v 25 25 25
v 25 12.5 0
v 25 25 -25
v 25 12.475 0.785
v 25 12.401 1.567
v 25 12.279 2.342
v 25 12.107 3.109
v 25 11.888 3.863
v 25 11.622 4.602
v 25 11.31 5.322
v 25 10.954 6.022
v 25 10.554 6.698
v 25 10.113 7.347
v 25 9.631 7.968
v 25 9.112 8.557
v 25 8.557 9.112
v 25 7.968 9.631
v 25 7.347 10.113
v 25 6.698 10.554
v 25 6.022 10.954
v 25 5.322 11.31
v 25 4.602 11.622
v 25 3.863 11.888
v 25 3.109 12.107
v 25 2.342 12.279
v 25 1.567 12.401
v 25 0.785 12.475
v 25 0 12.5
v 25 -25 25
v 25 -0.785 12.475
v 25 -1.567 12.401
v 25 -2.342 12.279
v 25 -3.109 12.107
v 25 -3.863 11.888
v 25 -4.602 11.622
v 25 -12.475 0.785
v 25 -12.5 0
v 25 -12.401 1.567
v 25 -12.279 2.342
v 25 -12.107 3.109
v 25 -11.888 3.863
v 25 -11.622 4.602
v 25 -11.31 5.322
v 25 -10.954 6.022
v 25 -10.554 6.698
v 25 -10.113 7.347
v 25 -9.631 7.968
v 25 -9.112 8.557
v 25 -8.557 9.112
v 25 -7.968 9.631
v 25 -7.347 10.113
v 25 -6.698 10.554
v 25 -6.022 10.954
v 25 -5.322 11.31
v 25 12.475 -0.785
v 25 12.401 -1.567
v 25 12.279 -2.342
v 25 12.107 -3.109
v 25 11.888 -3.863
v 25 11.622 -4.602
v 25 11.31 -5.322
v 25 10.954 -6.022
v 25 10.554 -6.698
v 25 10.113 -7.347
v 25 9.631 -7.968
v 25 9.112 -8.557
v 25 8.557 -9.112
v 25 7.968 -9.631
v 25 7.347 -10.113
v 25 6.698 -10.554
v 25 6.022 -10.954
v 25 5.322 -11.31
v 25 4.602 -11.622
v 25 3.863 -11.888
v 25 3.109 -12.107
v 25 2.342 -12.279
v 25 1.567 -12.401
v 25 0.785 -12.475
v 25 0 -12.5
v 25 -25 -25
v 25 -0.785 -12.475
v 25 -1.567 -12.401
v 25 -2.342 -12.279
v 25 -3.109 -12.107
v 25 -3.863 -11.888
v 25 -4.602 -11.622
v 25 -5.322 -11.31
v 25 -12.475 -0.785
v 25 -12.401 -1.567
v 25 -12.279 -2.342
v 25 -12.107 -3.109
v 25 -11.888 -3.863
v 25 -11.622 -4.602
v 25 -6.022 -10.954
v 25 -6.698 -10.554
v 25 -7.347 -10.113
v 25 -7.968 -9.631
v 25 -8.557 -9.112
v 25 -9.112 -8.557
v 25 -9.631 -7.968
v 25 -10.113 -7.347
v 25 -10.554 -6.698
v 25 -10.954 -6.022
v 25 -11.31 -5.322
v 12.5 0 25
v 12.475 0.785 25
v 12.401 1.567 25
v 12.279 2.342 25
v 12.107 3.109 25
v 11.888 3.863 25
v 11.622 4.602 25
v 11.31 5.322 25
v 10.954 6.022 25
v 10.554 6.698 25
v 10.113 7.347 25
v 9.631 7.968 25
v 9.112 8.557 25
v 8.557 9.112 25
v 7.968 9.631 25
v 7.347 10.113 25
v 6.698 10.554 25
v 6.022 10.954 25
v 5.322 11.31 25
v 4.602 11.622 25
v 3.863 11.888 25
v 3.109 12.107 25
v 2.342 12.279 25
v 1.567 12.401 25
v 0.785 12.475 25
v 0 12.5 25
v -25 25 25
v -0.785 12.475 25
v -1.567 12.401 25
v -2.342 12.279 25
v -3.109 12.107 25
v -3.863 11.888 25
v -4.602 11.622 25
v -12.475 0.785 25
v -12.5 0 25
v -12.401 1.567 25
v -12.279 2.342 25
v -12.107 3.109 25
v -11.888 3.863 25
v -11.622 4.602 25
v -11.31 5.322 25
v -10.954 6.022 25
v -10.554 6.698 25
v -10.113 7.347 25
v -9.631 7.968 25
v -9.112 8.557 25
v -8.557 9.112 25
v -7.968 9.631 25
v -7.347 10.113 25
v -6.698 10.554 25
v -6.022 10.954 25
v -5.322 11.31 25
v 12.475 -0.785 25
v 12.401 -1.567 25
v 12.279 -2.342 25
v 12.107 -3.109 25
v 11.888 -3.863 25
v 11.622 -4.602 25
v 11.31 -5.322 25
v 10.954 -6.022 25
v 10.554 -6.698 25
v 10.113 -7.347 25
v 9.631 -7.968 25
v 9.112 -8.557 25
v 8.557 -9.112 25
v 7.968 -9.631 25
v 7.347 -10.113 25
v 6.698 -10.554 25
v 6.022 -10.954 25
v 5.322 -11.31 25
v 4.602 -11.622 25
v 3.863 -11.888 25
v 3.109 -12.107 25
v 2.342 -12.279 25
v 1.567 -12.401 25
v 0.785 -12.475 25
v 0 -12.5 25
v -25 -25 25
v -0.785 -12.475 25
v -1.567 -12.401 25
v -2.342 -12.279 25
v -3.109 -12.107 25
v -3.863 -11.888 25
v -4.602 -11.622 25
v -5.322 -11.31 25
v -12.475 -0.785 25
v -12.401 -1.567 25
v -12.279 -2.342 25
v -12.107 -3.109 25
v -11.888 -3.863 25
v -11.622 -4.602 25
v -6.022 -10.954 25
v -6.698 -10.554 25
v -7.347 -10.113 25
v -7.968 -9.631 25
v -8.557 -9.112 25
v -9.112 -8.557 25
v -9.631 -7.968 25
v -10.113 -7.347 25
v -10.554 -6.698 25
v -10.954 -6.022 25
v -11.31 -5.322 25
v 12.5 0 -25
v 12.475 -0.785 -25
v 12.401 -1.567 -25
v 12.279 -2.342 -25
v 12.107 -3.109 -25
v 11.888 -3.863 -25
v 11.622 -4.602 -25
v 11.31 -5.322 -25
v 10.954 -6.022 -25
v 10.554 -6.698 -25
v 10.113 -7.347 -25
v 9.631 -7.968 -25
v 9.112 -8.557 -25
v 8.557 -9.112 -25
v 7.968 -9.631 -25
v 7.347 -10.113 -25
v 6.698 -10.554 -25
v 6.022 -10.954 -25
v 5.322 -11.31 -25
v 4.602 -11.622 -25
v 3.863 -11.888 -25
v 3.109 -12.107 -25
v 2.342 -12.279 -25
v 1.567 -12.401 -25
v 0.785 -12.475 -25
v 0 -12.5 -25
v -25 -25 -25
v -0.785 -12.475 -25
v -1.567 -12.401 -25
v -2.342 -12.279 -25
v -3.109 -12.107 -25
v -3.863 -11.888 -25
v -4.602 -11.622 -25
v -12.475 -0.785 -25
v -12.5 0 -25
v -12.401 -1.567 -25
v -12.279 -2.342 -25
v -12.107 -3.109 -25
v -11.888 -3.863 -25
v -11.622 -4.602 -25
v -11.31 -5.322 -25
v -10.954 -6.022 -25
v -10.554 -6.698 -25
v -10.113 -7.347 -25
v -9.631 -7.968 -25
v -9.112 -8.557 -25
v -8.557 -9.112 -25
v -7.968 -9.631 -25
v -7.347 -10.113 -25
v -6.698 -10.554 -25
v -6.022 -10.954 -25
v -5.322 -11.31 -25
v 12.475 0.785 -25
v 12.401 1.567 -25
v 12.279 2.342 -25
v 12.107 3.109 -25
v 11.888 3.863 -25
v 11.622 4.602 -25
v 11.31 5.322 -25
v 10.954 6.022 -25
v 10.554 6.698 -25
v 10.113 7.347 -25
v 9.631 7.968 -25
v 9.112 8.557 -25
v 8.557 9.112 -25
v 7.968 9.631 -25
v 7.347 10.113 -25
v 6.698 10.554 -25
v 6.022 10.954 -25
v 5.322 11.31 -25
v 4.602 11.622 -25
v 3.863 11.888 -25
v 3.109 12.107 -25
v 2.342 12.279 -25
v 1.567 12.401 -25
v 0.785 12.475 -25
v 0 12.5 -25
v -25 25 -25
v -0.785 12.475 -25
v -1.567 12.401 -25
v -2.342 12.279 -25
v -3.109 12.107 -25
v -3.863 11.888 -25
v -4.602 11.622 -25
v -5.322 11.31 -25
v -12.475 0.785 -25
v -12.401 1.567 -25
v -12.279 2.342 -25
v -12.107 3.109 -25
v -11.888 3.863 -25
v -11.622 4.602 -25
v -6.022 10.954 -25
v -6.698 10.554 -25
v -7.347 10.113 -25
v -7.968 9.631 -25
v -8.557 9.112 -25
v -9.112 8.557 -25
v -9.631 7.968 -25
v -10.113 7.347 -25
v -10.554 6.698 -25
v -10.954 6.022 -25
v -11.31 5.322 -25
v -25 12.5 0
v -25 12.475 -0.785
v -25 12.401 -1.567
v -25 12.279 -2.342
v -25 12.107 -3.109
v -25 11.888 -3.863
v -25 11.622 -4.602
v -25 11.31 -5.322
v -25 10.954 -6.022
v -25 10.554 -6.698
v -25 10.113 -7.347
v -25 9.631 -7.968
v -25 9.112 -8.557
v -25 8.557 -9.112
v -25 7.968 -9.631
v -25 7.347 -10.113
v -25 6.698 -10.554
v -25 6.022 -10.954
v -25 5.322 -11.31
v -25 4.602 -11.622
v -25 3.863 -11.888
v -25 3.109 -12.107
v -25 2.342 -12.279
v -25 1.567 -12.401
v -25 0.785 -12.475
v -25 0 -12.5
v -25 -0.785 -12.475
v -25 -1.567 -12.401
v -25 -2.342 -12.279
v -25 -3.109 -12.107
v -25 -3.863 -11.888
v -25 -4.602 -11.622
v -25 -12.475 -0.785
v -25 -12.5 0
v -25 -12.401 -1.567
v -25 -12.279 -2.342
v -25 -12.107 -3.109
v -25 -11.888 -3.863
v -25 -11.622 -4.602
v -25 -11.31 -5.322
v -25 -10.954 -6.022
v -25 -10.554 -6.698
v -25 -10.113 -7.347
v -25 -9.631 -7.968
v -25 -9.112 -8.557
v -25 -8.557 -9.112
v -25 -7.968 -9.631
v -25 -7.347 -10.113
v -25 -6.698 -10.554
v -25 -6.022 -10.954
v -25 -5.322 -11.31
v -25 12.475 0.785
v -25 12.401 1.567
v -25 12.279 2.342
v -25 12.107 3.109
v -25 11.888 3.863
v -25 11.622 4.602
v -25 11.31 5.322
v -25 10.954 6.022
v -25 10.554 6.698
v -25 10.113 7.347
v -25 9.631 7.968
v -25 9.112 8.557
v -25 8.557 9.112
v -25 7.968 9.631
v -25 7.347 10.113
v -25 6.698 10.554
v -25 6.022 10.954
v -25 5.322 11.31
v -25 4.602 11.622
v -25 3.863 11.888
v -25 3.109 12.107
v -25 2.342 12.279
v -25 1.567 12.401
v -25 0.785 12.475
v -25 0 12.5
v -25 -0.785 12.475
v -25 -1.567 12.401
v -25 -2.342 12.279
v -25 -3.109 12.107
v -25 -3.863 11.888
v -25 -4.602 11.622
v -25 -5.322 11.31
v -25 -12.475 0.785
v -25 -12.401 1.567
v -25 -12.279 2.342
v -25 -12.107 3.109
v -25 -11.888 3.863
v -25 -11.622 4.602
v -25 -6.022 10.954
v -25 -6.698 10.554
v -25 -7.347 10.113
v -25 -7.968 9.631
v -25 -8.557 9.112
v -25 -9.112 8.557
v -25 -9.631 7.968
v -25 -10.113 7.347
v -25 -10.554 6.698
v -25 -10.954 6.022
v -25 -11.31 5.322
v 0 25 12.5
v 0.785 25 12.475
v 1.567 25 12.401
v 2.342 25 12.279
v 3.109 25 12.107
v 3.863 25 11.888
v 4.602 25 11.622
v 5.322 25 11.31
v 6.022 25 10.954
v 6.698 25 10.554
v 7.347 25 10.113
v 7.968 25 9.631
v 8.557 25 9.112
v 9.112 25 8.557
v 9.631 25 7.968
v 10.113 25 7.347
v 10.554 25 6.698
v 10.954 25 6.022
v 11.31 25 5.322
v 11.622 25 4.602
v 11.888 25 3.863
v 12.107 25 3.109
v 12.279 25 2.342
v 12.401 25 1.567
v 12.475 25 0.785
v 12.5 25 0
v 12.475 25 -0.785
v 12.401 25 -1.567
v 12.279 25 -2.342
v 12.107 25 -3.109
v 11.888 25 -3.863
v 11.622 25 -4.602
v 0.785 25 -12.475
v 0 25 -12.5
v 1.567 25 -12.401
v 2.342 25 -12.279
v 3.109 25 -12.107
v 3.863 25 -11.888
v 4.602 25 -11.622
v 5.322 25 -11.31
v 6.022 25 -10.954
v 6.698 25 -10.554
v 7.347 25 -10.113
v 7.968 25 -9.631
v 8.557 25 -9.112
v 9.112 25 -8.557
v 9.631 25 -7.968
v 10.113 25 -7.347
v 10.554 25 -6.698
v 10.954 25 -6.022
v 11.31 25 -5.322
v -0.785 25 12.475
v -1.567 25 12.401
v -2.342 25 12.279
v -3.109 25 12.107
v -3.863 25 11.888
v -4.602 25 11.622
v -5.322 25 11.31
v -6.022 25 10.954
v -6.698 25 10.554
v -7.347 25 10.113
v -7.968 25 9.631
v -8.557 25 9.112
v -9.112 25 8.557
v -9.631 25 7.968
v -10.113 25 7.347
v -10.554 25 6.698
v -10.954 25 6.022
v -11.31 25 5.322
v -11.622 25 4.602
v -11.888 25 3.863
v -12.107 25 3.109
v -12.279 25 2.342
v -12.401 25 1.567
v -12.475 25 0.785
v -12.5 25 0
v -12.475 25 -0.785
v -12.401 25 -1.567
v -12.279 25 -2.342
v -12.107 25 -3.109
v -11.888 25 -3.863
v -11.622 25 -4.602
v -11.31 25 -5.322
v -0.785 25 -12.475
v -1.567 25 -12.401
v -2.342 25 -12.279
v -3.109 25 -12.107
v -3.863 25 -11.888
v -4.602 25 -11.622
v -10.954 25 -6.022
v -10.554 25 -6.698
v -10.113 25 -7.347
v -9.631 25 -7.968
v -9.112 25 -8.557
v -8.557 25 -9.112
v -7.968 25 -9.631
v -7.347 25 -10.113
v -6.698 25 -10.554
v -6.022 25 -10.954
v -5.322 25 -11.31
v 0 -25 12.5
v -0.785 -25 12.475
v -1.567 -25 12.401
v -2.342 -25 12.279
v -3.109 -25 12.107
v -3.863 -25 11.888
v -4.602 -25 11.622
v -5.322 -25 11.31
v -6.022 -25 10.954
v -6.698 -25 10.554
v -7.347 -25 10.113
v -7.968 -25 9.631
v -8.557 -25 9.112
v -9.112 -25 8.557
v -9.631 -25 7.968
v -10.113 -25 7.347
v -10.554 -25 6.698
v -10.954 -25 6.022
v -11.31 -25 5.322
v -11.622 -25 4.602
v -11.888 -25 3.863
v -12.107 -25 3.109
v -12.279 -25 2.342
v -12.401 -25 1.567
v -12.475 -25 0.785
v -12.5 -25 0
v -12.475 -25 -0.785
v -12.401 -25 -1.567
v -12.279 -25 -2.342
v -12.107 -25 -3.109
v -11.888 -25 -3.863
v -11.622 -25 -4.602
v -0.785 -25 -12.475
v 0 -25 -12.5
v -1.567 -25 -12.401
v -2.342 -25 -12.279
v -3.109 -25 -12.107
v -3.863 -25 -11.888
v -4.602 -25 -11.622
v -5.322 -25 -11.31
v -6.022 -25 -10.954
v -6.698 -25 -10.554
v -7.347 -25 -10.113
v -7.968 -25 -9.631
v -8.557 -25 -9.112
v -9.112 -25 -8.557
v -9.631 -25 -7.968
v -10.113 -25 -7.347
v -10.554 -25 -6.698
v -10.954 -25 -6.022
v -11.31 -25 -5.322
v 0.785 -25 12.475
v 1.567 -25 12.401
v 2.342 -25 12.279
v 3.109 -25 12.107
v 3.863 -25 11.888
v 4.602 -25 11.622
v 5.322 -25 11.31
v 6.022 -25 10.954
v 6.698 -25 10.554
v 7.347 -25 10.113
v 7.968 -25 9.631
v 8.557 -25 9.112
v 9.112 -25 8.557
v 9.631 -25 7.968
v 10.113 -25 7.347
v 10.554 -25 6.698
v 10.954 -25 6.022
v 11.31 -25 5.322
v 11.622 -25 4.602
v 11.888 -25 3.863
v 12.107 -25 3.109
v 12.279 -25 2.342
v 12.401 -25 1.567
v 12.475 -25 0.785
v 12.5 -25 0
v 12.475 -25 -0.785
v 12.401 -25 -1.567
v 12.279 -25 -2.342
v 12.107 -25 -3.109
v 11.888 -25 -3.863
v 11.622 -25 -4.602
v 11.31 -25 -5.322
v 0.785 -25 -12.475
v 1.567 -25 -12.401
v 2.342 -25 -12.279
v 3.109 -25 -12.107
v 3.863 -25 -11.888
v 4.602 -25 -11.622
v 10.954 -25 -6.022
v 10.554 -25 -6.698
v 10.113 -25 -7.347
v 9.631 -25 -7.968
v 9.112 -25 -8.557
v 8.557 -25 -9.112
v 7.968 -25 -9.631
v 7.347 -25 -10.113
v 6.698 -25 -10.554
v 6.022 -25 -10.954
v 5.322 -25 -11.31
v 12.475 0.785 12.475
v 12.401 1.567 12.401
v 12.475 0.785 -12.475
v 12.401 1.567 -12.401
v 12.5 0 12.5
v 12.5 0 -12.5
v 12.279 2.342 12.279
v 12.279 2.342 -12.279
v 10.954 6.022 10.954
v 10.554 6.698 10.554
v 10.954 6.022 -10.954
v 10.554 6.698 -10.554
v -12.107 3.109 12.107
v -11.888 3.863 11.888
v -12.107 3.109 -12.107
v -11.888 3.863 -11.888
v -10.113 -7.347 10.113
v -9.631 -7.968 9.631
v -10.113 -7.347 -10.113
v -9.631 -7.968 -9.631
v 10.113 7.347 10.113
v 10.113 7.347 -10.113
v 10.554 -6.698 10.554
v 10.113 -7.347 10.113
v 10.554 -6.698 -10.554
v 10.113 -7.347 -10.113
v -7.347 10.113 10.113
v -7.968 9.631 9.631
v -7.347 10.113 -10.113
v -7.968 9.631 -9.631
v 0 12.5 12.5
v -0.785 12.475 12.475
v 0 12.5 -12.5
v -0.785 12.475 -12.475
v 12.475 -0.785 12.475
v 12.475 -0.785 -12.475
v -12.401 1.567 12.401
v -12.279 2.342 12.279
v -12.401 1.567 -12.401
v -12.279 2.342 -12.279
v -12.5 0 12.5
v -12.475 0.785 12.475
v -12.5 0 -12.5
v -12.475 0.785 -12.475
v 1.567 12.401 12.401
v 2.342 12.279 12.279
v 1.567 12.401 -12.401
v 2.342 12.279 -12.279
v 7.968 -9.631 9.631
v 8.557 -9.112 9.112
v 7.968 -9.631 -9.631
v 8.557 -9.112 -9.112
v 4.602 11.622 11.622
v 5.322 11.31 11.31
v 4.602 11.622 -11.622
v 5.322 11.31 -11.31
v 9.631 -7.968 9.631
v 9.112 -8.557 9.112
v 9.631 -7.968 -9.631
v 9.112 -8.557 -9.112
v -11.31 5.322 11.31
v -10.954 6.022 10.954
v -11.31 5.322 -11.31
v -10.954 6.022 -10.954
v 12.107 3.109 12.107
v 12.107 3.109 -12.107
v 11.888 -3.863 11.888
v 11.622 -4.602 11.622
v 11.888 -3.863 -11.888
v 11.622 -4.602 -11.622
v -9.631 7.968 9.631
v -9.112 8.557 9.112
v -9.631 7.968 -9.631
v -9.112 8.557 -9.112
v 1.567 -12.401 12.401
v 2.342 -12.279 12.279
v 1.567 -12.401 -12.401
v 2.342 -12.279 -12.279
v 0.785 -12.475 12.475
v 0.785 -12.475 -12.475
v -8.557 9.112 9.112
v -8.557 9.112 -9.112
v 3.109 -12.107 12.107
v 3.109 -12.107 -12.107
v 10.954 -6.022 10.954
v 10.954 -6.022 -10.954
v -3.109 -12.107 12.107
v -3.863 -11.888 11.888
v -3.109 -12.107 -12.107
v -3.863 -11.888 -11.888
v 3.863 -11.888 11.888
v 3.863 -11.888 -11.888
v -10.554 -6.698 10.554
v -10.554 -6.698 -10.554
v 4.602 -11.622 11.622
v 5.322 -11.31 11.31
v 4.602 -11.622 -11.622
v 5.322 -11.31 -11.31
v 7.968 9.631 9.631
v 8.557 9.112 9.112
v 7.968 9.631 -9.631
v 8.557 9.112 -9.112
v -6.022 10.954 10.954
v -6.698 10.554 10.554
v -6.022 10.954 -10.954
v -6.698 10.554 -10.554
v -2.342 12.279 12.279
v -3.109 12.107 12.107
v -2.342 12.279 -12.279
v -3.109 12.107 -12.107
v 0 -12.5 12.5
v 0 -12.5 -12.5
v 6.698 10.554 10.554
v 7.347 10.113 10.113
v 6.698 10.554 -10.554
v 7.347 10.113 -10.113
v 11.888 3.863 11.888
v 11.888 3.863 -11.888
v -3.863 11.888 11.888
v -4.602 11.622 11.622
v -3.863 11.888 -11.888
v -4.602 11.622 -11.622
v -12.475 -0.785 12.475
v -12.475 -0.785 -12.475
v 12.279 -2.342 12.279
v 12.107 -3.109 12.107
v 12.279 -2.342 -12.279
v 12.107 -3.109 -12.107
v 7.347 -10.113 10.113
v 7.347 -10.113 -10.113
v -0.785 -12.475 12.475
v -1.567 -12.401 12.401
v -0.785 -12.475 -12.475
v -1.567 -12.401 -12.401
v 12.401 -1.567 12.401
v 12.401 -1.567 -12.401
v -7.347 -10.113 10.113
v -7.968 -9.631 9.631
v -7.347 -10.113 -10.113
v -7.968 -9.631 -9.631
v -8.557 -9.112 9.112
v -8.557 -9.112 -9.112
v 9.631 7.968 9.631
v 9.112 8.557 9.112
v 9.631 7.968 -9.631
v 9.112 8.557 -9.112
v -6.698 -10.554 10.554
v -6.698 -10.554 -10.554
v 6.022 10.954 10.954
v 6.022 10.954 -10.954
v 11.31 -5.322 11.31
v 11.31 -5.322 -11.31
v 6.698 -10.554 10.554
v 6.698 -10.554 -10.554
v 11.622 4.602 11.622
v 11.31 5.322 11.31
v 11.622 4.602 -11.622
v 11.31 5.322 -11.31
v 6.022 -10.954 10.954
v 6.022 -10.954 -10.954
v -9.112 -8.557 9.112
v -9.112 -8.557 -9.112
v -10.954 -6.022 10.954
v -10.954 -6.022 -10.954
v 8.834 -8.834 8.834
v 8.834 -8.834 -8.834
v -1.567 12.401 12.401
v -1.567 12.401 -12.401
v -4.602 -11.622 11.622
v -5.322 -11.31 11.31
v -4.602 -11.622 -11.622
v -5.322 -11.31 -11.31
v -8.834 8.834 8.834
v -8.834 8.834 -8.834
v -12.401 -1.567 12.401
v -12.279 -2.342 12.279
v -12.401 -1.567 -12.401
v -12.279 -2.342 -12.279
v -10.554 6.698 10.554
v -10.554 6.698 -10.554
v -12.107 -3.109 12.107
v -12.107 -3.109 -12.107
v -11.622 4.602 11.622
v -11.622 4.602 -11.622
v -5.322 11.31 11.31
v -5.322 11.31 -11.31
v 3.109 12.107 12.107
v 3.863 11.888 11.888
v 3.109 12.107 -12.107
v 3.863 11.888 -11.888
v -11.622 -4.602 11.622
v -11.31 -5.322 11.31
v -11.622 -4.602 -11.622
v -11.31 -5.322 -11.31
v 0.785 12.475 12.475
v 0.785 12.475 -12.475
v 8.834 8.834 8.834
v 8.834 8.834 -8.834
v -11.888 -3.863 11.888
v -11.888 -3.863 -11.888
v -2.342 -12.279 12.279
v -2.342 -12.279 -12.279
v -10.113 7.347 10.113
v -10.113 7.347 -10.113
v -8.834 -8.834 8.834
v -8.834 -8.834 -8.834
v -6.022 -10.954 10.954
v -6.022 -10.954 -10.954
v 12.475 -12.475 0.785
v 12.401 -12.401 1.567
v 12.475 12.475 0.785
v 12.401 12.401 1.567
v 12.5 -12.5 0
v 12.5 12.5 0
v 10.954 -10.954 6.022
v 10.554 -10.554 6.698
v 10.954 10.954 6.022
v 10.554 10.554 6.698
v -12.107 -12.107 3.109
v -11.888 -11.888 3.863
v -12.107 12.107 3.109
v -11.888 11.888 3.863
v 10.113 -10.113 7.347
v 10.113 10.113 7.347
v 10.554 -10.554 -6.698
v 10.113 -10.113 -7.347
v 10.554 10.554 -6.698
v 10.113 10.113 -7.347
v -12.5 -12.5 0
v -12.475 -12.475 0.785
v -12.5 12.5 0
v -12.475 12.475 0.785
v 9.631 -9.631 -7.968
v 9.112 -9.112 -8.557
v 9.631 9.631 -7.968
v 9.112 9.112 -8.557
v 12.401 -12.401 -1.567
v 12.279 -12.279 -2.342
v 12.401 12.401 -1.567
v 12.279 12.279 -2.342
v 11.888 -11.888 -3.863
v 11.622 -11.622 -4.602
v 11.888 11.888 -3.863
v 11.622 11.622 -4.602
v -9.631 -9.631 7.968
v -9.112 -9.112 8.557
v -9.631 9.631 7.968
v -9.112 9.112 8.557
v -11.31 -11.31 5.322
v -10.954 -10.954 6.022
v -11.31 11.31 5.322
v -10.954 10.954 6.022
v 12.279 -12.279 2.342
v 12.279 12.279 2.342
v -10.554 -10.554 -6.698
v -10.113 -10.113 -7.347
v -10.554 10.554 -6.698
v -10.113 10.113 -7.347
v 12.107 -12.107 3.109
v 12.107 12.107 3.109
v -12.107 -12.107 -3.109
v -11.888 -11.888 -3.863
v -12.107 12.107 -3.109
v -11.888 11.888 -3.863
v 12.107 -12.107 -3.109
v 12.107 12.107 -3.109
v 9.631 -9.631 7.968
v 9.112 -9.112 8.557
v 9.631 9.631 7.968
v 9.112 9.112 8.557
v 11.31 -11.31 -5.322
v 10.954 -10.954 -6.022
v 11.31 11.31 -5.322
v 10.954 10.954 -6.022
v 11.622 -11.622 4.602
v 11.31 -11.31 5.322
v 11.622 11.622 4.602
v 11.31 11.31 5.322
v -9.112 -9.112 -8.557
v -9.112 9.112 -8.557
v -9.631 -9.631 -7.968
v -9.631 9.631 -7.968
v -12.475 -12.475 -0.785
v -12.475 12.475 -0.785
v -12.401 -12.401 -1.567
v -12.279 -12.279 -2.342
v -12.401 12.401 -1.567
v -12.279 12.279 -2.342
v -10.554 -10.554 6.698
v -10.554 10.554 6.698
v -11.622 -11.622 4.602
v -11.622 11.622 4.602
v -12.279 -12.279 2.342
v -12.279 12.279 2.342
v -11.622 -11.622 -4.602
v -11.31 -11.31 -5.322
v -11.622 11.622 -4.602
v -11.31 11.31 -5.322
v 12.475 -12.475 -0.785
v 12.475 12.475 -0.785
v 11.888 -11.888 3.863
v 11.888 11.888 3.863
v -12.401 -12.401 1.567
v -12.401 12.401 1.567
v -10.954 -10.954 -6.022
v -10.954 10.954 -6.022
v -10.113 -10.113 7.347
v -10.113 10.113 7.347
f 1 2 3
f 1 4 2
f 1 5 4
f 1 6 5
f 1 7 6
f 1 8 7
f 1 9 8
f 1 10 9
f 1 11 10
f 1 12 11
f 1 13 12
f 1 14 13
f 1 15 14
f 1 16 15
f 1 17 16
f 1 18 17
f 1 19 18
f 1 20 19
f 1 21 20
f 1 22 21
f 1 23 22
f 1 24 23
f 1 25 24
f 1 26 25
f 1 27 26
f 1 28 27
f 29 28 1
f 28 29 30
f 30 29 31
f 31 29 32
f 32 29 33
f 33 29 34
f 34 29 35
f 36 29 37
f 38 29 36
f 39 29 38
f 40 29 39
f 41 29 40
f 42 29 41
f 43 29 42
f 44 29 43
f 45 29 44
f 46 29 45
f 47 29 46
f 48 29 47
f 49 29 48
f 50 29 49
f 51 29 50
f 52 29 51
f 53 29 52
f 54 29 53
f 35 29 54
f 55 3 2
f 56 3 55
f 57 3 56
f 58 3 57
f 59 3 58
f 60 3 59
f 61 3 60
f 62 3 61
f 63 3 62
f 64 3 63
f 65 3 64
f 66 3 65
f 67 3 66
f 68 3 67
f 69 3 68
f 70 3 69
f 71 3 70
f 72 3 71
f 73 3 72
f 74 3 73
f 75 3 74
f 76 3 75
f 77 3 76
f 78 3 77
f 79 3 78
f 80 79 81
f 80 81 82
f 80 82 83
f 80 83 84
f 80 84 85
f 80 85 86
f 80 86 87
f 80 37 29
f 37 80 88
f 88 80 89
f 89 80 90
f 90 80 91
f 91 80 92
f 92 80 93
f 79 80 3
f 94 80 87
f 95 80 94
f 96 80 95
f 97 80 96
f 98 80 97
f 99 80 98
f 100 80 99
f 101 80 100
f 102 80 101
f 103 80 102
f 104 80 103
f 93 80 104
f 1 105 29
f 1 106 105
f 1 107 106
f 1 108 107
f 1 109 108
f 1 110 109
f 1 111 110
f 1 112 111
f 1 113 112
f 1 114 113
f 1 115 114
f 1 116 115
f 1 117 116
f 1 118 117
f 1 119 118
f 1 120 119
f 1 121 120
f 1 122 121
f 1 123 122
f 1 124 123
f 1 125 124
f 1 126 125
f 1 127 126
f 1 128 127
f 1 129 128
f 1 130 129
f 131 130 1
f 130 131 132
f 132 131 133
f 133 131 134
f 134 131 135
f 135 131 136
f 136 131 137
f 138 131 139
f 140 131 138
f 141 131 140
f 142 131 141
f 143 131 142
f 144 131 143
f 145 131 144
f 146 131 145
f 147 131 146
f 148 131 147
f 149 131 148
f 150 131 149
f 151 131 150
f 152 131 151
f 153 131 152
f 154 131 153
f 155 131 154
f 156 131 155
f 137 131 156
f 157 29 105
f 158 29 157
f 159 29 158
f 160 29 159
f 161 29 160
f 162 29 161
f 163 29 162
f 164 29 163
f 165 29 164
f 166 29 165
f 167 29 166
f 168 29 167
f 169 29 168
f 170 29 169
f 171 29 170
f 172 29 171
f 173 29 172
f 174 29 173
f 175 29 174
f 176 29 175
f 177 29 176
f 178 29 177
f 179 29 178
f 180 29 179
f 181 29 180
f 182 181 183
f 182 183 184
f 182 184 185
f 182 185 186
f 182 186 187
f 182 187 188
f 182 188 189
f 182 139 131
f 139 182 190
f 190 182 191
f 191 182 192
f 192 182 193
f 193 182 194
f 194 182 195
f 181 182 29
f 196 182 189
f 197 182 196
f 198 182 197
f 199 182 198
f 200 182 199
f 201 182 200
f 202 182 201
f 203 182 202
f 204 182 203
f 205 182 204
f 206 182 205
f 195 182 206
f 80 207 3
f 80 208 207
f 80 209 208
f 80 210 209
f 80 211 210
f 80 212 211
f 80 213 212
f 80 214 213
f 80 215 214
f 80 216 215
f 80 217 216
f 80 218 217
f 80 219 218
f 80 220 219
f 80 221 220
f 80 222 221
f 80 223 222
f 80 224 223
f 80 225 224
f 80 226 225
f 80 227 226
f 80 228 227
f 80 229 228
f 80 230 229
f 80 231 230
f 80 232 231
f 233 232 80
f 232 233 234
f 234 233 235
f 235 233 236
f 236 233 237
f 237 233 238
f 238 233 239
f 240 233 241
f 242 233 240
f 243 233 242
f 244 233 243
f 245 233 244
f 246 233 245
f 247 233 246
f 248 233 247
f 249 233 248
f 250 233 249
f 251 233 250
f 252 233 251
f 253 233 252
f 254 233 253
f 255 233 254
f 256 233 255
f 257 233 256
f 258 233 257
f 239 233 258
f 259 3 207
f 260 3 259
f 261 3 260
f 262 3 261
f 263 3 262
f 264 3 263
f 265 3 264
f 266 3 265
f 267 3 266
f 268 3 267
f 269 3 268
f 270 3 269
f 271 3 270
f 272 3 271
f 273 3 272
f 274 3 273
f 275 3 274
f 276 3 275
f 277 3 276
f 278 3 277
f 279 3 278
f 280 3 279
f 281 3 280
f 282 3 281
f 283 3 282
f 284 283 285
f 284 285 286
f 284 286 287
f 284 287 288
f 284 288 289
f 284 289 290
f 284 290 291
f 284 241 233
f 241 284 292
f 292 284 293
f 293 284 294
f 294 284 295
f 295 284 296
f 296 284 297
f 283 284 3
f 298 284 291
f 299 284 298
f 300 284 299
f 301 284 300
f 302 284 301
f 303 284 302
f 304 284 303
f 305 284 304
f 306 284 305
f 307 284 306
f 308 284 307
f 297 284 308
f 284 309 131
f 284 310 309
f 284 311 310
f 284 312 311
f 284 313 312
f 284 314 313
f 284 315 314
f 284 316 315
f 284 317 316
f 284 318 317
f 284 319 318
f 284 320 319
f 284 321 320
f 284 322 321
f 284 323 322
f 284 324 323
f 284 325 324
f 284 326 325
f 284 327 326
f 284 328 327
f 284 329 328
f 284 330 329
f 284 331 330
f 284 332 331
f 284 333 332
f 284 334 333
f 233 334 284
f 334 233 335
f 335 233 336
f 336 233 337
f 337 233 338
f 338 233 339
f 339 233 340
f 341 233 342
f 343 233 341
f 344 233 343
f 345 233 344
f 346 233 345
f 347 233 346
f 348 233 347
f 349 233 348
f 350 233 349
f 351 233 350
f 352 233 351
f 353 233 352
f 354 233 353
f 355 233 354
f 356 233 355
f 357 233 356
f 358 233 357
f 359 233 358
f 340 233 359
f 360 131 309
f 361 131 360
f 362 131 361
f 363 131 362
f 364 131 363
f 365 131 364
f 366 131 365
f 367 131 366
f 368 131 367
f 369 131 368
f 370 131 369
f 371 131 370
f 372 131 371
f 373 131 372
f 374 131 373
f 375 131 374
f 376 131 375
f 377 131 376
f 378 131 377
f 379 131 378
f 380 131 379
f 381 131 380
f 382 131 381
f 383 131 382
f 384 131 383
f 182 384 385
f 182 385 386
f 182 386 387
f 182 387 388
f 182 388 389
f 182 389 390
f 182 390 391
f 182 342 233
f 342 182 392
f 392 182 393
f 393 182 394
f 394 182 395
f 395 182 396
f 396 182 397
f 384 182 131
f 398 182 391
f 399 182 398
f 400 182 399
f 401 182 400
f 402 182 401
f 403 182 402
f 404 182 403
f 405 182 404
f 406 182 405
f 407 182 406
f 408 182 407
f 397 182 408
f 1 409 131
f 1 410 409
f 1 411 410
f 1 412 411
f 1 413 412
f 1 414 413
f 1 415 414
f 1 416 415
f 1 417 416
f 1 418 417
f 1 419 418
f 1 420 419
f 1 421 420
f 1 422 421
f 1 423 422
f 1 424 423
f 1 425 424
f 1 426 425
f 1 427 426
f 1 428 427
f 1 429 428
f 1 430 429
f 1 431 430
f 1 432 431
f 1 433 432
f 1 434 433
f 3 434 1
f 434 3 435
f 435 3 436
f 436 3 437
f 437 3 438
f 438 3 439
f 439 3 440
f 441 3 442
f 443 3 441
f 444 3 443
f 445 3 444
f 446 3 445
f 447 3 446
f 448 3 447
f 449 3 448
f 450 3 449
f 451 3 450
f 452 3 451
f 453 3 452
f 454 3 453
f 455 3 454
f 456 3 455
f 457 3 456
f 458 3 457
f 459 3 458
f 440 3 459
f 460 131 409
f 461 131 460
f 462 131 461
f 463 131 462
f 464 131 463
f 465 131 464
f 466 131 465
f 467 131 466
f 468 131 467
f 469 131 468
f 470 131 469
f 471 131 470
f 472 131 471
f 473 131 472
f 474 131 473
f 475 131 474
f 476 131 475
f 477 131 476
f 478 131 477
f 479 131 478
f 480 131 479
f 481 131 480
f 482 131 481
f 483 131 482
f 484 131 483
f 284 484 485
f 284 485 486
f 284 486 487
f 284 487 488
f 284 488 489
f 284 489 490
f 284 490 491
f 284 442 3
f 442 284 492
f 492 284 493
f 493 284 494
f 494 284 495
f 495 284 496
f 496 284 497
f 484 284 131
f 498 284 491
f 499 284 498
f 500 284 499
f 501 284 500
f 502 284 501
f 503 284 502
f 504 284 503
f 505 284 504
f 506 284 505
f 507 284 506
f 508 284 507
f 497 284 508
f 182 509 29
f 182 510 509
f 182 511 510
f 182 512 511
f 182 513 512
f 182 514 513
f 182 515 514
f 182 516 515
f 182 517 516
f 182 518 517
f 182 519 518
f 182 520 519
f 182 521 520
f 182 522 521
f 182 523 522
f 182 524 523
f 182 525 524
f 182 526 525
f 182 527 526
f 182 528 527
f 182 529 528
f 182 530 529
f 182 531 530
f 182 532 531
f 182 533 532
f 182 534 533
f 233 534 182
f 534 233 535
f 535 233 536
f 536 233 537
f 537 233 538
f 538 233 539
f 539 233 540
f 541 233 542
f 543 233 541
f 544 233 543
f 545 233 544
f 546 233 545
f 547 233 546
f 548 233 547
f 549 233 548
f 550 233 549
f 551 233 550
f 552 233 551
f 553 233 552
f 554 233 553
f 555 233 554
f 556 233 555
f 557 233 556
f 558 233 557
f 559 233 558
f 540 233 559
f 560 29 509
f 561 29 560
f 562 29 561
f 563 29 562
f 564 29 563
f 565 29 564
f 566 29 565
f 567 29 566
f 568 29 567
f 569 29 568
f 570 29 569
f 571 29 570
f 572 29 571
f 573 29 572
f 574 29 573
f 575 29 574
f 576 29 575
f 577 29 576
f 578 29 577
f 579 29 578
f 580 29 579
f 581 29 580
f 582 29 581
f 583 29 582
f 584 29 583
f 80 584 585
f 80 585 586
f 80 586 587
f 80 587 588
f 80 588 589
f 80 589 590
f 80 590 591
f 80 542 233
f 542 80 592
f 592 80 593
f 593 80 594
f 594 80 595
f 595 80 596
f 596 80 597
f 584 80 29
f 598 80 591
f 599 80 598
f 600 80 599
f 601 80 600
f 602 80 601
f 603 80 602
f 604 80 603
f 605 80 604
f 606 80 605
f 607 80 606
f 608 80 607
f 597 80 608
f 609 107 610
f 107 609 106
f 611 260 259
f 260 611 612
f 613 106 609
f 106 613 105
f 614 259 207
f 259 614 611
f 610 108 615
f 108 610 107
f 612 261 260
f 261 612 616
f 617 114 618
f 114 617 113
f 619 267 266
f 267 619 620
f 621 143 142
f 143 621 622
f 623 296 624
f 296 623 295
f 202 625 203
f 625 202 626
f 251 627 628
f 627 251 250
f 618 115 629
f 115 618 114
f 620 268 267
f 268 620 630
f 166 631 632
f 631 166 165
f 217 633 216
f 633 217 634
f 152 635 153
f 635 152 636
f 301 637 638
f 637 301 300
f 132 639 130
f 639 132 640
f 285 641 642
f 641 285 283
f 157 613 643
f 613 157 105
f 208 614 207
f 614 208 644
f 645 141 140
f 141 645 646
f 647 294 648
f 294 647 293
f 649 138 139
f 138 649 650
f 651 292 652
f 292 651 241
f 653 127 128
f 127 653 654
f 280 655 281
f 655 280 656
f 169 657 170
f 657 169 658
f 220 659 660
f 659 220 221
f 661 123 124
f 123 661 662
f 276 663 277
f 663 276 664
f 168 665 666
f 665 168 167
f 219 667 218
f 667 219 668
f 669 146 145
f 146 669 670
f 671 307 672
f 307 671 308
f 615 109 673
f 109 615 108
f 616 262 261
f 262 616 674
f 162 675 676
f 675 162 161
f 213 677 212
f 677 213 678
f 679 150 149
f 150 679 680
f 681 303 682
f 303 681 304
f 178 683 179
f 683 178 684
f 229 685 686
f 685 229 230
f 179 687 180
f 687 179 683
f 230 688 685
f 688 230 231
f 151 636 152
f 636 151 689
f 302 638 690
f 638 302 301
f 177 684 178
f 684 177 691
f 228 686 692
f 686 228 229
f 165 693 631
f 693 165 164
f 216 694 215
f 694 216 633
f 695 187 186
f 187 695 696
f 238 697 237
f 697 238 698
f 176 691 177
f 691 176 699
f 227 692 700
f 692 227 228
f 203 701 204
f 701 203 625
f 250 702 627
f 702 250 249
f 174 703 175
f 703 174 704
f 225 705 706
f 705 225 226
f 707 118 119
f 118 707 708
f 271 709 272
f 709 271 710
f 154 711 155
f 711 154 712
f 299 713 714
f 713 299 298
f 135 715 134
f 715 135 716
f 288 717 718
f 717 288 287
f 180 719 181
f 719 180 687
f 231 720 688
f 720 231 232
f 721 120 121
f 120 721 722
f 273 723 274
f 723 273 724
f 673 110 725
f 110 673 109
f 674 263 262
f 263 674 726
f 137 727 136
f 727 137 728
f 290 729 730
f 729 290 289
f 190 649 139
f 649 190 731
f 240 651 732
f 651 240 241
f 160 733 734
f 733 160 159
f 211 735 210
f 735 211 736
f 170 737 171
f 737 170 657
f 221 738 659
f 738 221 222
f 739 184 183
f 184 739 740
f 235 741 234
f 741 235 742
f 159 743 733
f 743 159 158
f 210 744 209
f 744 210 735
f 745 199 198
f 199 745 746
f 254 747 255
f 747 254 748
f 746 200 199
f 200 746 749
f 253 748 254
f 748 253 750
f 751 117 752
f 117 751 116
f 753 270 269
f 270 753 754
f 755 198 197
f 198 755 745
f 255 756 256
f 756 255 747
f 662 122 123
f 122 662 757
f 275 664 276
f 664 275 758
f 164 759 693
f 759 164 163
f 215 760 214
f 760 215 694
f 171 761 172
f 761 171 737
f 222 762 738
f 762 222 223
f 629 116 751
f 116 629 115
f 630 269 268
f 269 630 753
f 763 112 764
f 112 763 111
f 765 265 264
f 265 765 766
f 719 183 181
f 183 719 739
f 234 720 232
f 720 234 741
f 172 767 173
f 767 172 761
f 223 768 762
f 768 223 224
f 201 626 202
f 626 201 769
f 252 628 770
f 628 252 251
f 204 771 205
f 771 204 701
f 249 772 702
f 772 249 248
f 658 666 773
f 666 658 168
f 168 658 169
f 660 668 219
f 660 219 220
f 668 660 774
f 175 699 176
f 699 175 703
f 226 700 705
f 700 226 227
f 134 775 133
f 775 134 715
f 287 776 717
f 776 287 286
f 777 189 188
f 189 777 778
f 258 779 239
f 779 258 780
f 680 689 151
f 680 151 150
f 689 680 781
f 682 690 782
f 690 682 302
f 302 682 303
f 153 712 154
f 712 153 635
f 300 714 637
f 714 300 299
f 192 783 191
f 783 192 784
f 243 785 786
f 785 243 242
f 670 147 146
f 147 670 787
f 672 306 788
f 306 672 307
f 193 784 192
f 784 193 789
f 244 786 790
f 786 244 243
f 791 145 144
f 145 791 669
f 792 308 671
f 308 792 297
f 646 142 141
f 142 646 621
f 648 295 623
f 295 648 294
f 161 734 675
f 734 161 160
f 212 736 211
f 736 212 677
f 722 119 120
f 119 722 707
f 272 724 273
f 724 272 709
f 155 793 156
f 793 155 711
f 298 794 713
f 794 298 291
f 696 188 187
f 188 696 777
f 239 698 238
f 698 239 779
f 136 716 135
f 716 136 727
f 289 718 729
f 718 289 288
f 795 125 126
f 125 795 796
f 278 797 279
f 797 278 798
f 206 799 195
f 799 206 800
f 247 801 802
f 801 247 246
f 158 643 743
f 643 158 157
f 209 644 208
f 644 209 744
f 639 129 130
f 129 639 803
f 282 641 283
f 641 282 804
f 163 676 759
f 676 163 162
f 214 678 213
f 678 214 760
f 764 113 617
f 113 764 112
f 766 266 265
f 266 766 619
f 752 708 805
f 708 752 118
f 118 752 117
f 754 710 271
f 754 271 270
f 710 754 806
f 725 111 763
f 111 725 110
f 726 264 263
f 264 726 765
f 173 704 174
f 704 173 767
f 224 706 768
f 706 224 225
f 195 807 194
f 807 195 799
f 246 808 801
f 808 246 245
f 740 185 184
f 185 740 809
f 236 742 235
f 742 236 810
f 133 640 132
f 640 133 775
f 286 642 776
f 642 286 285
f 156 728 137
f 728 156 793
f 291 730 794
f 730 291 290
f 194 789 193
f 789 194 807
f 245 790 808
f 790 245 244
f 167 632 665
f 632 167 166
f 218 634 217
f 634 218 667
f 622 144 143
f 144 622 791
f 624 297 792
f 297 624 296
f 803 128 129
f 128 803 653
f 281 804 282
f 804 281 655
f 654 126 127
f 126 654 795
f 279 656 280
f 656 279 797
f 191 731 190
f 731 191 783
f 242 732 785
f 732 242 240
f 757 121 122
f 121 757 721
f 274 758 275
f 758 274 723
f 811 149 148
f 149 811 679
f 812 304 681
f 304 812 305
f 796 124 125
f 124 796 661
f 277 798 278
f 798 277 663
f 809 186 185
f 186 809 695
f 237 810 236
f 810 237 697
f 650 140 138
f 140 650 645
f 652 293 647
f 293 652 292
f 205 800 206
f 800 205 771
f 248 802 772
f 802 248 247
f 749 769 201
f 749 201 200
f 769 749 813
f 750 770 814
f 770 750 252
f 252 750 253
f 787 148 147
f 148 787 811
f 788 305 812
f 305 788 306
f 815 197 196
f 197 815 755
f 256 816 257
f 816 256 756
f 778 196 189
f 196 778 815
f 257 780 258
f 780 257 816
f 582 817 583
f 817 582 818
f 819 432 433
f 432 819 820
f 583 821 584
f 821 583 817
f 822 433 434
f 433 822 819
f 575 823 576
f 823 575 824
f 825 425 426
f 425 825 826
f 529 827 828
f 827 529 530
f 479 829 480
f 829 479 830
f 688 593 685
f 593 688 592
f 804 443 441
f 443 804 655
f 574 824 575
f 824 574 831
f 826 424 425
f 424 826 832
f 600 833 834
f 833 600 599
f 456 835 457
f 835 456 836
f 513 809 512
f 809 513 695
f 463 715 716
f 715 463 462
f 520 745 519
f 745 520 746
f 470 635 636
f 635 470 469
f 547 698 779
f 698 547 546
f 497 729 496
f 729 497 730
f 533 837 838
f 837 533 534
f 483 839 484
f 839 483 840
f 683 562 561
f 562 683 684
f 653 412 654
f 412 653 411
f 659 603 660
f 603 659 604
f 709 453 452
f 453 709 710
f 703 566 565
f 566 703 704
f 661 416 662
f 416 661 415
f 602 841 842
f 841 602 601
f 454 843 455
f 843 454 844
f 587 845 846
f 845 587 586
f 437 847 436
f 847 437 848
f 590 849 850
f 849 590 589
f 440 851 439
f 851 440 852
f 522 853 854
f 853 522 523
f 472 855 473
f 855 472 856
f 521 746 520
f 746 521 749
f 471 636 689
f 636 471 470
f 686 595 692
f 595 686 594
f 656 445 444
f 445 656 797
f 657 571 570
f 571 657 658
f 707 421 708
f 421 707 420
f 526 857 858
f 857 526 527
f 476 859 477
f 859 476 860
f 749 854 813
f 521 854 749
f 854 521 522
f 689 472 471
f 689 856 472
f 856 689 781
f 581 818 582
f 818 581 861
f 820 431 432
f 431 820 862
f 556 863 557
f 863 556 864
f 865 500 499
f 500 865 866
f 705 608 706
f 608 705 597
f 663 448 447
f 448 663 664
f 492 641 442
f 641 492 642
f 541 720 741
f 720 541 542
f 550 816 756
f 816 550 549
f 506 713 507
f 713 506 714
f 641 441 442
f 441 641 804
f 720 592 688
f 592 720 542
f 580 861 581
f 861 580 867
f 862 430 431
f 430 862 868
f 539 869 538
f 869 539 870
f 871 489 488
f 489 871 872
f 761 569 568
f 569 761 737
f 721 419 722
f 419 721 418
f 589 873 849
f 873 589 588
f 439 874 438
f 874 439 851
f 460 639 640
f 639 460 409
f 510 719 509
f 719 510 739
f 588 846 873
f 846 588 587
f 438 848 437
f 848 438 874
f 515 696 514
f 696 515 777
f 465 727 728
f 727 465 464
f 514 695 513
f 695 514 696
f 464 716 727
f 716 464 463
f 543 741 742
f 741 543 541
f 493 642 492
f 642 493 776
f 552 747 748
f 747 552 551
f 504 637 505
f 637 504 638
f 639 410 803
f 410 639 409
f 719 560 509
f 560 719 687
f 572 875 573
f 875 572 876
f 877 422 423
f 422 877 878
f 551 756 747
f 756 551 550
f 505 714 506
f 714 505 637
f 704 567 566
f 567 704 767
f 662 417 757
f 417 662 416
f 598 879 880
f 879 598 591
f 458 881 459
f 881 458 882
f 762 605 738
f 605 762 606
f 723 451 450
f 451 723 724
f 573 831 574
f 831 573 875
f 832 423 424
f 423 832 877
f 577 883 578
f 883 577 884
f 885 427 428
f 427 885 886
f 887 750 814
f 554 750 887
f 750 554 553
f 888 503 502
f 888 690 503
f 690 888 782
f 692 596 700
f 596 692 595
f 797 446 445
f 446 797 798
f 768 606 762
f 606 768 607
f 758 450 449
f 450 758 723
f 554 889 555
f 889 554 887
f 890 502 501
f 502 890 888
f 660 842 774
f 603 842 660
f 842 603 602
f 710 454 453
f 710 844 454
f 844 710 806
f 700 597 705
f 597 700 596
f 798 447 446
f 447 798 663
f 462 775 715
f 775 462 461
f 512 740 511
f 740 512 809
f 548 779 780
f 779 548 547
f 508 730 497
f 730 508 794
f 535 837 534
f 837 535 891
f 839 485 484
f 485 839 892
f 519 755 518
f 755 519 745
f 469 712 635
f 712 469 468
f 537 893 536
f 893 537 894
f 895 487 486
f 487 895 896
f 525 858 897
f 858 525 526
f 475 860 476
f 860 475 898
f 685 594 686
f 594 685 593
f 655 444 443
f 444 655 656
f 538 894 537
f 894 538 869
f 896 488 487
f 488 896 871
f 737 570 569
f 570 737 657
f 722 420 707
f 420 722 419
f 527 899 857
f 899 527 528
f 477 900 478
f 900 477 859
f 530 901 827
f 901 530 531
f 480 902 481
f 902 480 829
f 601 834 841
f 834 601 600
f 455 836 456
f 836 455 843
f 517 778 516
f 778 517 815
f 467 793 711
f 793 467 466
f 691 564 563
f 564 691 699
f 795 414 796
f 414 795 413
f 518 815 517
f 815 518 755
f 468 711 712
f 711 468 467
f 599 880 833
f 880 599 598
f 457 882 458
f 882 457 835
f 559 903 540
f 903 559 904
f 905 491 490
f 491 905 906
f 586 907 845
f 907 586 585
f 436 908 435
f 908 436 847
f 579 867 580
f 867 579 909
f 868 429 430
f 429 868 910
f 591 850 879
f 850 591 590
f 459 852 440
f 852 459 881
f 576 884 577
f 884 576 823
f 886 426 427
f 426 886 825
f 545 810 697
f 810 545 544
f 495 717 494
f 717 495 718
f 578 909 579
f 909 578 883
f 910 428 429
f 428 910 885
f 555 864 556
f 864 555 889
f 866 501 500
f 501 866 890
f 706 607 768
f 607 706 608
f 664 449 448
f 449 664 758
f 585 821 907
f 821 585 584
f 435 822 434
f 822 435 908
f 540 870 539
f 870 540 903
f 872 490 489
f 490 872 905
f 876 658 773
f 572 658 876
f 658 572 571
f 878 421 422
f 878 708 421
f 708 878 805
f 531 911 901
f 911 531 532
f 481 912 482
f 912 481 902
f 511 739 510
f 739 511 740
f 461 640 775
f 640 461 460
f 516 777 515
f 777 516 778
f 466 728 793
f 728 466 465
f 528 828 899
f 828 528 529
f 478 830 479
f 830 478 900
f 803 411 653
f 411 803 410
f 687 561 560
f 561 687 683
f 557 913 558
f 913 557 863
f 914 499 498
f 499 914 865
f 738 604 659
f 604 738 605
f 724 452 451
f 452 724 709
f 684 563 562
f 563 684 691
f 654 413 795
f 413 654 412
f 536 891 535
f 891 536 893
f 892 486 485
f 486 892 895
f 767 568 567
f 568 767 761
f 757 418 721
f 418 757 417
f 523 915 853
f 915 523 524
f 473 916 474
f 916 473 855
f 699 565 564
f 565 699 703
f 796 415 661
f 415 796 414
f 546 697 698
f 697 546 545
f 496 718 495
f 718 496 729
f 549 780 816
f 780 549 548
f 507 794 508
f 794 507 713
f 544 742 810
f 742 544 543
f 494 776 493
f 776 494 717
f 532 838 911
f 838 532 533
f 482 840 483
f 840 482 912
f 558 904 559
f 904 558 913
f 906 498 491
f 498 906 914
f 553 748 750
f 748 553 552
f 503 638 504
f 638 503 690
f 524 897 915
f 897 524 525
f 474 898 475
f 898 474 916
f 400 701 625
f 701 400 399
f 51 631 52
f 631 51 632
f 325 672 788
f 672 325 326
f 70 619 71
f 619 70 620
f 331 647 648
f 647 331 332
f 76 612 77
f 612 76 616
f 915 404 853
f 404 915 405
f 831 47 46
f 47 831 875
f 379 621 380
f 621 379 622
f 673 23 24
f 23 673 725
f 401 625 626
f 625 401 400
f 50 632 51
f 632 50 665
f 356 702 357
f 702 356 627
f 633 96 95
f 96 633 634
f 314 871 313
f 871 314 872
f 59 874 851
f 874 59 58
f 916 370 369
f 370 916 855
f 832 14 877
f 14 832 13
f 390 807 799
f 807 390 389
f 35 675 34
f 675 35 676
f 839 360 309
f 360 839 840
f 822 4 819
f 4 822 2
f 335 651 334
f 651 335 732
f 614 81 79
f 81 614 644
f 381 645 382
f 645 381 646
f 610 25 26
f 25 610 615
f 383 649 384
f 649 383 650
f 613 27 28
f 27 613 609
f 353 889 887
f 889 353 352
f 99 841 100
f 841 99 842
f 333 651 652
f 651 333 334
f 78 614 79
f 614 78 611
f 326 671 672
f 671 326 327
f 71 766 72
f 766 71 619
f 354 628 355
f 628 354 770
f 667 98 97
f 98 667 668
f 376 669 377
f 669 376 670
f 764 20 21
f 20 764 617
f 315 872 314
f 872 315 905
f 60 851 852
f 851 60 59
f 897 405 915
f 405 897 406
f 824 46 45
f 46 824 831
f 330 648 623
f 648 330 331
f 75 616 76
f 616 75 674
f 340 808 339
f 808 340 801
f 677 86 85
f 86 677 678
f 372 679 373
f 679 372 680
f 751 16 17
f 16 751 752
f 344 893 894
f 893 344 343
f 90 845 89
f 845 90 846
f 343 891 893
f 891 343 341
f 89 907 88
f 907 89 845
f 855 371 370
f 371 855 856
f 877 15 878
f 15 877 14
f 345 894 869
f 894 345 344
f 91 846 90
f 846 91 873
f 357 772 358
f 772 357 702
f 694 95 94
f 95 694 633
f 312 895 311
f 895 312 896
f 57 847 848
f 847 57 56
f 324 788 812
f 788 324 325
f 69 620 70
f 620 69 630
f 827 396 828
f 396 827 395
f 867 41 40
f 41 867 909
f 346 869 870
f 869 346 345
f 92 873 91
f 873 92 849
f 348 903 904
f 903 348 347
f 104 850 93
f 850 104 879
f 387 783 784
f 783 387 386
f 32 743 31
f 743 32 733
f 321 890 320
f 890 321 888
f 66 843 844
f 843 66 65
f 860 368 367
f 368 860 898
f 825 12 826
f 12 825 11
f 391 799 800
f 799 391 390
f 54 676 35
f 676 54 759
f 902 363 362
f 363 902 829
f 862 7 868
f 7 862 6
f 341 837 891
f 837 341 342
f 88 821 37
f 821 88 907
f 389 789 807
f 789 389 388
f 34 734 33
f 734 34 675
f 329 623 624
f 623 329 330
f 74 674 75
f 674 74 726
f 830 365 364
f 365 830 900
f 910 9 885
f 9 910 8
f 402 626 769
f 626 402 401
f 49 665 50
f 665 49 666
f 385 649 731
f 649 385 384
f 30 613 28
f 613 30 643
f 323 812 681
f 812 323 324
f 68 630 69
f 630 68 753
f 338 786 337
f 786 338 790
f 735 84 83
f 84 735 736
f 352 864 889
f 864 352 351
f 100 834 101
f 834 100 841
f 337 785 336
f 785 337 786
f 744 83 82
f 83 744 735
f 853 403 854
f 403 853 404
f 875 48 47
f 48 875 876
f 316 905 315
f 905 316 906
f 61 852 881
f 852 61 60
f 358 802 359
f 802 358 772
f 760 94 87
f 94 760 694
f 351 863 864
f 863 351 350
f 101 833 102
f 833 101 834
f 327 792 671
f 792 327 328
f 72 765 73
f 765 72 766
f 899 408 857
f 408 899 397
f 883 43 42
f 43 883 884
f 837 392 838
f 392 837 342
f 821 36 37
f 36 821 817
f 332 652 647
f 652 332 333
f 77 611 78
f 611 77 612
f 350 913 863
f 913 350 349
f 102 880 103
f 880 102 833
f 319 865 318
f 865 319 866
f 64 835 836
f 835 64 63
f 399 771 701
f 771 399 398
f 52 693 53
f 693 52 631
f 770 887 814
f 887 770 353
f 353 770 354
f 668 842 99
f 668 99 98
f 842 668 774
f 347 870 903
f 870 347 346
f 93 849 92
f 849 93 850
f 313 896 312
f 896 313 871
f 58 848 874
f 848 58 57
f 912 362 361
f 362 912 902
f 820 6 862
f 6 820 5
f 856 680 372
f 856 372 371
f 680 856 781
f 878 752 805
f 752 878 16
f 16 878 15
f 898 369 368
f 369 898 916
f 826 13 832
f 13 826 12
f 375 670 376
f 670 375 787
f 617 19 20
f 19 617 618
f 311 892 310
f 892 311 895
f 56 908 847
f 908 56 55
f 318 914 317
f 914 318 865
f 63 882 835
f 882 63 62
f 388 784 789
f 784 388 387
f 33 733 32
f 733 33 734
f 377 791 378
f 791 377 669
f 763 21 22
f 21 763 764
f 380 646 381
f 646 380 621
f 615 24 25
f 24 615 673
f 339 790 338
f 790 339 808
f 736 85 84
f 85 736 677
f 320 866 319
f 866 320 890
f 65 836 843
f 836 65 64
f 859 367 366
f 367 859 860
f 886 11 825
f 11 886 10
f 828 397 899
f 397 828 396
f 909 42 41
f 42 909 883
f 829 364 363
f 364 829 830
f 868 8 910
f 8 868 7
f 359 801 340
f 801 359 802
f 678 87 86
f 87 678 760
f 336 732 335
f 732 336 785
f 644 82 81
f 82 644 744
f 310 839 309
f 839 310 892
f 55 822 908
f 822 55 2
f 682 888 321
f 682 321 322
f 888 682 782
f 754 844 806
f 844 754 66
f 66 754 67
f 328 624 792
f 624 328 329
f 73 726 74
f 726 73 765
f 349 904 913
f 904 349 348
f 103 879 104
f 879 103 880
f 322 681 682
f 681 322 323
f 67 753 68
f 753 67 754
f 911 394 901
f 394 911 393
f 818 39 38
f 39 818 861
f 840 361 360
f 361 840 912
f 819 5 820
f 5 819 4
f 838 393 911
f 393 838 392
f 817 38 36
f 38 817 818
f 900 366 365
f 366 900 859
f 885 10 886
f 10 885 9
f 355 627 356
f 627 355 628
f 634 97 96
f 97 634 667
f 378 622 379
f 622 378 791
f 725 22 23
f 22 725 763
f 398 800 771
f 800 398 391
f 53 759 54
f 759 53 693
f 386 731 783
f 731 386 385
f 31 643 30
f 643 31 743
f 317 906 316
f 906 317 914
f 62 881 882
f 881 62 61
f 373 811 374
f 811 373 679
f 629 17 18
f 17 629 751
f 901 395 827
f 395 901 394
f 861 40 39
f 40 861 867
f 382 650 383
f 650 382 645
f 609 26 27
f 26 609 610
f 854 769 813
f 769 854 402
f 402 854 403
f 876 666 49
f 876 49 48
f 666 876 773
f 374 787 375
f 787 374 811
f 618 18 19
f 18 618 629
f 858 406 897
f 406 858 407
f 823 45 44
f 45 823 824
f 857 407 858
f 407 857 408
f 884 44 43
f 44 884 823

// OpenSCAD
// logo.scad - Basic example of module, top-level variable and $fn usage

Logo(50);

// The $fn parameter will influence all objects inside this module
// It can, optionally, be overridden when instantiating the module
module Logo(size=50, $fn=100) {
    // Temporary variables
    hole = size/2;
    cylinderHeight = size * 1.25;

    // One positive object (sphere) and three negative objects (cylinders)
    difference() {
        // sphere(d=size);
        cube(size,center=true);

        cylinder(d=hole, h=cylinderHeight, center=true);
        // The '#' operator highlights the object
        #rotate([90, 0, 0]) cylinder(d=hole, h=cylinderHeight, center=true);
        rotate([0, 90, 0]) cylinder(d=hole, h=cylinderHeight, center=true);
    }
}

echo(version=version());
// Written by Clifford Wolf <clifford@clifford.at> and Marius
// Kintel <marius@kintel.net>
//
// To the extent possible under law, the author(s) have dedicated all
// copyright and related and neighboring rights to this software to the
// public domain worldwide. This software is distributed without any
// warranty.
//
// You should have received a copy of the CC0 Public Domain
// Dedication along with this software.
// If not, see <http://creativecommons.org/publicdomain/zero/1.0/>.
